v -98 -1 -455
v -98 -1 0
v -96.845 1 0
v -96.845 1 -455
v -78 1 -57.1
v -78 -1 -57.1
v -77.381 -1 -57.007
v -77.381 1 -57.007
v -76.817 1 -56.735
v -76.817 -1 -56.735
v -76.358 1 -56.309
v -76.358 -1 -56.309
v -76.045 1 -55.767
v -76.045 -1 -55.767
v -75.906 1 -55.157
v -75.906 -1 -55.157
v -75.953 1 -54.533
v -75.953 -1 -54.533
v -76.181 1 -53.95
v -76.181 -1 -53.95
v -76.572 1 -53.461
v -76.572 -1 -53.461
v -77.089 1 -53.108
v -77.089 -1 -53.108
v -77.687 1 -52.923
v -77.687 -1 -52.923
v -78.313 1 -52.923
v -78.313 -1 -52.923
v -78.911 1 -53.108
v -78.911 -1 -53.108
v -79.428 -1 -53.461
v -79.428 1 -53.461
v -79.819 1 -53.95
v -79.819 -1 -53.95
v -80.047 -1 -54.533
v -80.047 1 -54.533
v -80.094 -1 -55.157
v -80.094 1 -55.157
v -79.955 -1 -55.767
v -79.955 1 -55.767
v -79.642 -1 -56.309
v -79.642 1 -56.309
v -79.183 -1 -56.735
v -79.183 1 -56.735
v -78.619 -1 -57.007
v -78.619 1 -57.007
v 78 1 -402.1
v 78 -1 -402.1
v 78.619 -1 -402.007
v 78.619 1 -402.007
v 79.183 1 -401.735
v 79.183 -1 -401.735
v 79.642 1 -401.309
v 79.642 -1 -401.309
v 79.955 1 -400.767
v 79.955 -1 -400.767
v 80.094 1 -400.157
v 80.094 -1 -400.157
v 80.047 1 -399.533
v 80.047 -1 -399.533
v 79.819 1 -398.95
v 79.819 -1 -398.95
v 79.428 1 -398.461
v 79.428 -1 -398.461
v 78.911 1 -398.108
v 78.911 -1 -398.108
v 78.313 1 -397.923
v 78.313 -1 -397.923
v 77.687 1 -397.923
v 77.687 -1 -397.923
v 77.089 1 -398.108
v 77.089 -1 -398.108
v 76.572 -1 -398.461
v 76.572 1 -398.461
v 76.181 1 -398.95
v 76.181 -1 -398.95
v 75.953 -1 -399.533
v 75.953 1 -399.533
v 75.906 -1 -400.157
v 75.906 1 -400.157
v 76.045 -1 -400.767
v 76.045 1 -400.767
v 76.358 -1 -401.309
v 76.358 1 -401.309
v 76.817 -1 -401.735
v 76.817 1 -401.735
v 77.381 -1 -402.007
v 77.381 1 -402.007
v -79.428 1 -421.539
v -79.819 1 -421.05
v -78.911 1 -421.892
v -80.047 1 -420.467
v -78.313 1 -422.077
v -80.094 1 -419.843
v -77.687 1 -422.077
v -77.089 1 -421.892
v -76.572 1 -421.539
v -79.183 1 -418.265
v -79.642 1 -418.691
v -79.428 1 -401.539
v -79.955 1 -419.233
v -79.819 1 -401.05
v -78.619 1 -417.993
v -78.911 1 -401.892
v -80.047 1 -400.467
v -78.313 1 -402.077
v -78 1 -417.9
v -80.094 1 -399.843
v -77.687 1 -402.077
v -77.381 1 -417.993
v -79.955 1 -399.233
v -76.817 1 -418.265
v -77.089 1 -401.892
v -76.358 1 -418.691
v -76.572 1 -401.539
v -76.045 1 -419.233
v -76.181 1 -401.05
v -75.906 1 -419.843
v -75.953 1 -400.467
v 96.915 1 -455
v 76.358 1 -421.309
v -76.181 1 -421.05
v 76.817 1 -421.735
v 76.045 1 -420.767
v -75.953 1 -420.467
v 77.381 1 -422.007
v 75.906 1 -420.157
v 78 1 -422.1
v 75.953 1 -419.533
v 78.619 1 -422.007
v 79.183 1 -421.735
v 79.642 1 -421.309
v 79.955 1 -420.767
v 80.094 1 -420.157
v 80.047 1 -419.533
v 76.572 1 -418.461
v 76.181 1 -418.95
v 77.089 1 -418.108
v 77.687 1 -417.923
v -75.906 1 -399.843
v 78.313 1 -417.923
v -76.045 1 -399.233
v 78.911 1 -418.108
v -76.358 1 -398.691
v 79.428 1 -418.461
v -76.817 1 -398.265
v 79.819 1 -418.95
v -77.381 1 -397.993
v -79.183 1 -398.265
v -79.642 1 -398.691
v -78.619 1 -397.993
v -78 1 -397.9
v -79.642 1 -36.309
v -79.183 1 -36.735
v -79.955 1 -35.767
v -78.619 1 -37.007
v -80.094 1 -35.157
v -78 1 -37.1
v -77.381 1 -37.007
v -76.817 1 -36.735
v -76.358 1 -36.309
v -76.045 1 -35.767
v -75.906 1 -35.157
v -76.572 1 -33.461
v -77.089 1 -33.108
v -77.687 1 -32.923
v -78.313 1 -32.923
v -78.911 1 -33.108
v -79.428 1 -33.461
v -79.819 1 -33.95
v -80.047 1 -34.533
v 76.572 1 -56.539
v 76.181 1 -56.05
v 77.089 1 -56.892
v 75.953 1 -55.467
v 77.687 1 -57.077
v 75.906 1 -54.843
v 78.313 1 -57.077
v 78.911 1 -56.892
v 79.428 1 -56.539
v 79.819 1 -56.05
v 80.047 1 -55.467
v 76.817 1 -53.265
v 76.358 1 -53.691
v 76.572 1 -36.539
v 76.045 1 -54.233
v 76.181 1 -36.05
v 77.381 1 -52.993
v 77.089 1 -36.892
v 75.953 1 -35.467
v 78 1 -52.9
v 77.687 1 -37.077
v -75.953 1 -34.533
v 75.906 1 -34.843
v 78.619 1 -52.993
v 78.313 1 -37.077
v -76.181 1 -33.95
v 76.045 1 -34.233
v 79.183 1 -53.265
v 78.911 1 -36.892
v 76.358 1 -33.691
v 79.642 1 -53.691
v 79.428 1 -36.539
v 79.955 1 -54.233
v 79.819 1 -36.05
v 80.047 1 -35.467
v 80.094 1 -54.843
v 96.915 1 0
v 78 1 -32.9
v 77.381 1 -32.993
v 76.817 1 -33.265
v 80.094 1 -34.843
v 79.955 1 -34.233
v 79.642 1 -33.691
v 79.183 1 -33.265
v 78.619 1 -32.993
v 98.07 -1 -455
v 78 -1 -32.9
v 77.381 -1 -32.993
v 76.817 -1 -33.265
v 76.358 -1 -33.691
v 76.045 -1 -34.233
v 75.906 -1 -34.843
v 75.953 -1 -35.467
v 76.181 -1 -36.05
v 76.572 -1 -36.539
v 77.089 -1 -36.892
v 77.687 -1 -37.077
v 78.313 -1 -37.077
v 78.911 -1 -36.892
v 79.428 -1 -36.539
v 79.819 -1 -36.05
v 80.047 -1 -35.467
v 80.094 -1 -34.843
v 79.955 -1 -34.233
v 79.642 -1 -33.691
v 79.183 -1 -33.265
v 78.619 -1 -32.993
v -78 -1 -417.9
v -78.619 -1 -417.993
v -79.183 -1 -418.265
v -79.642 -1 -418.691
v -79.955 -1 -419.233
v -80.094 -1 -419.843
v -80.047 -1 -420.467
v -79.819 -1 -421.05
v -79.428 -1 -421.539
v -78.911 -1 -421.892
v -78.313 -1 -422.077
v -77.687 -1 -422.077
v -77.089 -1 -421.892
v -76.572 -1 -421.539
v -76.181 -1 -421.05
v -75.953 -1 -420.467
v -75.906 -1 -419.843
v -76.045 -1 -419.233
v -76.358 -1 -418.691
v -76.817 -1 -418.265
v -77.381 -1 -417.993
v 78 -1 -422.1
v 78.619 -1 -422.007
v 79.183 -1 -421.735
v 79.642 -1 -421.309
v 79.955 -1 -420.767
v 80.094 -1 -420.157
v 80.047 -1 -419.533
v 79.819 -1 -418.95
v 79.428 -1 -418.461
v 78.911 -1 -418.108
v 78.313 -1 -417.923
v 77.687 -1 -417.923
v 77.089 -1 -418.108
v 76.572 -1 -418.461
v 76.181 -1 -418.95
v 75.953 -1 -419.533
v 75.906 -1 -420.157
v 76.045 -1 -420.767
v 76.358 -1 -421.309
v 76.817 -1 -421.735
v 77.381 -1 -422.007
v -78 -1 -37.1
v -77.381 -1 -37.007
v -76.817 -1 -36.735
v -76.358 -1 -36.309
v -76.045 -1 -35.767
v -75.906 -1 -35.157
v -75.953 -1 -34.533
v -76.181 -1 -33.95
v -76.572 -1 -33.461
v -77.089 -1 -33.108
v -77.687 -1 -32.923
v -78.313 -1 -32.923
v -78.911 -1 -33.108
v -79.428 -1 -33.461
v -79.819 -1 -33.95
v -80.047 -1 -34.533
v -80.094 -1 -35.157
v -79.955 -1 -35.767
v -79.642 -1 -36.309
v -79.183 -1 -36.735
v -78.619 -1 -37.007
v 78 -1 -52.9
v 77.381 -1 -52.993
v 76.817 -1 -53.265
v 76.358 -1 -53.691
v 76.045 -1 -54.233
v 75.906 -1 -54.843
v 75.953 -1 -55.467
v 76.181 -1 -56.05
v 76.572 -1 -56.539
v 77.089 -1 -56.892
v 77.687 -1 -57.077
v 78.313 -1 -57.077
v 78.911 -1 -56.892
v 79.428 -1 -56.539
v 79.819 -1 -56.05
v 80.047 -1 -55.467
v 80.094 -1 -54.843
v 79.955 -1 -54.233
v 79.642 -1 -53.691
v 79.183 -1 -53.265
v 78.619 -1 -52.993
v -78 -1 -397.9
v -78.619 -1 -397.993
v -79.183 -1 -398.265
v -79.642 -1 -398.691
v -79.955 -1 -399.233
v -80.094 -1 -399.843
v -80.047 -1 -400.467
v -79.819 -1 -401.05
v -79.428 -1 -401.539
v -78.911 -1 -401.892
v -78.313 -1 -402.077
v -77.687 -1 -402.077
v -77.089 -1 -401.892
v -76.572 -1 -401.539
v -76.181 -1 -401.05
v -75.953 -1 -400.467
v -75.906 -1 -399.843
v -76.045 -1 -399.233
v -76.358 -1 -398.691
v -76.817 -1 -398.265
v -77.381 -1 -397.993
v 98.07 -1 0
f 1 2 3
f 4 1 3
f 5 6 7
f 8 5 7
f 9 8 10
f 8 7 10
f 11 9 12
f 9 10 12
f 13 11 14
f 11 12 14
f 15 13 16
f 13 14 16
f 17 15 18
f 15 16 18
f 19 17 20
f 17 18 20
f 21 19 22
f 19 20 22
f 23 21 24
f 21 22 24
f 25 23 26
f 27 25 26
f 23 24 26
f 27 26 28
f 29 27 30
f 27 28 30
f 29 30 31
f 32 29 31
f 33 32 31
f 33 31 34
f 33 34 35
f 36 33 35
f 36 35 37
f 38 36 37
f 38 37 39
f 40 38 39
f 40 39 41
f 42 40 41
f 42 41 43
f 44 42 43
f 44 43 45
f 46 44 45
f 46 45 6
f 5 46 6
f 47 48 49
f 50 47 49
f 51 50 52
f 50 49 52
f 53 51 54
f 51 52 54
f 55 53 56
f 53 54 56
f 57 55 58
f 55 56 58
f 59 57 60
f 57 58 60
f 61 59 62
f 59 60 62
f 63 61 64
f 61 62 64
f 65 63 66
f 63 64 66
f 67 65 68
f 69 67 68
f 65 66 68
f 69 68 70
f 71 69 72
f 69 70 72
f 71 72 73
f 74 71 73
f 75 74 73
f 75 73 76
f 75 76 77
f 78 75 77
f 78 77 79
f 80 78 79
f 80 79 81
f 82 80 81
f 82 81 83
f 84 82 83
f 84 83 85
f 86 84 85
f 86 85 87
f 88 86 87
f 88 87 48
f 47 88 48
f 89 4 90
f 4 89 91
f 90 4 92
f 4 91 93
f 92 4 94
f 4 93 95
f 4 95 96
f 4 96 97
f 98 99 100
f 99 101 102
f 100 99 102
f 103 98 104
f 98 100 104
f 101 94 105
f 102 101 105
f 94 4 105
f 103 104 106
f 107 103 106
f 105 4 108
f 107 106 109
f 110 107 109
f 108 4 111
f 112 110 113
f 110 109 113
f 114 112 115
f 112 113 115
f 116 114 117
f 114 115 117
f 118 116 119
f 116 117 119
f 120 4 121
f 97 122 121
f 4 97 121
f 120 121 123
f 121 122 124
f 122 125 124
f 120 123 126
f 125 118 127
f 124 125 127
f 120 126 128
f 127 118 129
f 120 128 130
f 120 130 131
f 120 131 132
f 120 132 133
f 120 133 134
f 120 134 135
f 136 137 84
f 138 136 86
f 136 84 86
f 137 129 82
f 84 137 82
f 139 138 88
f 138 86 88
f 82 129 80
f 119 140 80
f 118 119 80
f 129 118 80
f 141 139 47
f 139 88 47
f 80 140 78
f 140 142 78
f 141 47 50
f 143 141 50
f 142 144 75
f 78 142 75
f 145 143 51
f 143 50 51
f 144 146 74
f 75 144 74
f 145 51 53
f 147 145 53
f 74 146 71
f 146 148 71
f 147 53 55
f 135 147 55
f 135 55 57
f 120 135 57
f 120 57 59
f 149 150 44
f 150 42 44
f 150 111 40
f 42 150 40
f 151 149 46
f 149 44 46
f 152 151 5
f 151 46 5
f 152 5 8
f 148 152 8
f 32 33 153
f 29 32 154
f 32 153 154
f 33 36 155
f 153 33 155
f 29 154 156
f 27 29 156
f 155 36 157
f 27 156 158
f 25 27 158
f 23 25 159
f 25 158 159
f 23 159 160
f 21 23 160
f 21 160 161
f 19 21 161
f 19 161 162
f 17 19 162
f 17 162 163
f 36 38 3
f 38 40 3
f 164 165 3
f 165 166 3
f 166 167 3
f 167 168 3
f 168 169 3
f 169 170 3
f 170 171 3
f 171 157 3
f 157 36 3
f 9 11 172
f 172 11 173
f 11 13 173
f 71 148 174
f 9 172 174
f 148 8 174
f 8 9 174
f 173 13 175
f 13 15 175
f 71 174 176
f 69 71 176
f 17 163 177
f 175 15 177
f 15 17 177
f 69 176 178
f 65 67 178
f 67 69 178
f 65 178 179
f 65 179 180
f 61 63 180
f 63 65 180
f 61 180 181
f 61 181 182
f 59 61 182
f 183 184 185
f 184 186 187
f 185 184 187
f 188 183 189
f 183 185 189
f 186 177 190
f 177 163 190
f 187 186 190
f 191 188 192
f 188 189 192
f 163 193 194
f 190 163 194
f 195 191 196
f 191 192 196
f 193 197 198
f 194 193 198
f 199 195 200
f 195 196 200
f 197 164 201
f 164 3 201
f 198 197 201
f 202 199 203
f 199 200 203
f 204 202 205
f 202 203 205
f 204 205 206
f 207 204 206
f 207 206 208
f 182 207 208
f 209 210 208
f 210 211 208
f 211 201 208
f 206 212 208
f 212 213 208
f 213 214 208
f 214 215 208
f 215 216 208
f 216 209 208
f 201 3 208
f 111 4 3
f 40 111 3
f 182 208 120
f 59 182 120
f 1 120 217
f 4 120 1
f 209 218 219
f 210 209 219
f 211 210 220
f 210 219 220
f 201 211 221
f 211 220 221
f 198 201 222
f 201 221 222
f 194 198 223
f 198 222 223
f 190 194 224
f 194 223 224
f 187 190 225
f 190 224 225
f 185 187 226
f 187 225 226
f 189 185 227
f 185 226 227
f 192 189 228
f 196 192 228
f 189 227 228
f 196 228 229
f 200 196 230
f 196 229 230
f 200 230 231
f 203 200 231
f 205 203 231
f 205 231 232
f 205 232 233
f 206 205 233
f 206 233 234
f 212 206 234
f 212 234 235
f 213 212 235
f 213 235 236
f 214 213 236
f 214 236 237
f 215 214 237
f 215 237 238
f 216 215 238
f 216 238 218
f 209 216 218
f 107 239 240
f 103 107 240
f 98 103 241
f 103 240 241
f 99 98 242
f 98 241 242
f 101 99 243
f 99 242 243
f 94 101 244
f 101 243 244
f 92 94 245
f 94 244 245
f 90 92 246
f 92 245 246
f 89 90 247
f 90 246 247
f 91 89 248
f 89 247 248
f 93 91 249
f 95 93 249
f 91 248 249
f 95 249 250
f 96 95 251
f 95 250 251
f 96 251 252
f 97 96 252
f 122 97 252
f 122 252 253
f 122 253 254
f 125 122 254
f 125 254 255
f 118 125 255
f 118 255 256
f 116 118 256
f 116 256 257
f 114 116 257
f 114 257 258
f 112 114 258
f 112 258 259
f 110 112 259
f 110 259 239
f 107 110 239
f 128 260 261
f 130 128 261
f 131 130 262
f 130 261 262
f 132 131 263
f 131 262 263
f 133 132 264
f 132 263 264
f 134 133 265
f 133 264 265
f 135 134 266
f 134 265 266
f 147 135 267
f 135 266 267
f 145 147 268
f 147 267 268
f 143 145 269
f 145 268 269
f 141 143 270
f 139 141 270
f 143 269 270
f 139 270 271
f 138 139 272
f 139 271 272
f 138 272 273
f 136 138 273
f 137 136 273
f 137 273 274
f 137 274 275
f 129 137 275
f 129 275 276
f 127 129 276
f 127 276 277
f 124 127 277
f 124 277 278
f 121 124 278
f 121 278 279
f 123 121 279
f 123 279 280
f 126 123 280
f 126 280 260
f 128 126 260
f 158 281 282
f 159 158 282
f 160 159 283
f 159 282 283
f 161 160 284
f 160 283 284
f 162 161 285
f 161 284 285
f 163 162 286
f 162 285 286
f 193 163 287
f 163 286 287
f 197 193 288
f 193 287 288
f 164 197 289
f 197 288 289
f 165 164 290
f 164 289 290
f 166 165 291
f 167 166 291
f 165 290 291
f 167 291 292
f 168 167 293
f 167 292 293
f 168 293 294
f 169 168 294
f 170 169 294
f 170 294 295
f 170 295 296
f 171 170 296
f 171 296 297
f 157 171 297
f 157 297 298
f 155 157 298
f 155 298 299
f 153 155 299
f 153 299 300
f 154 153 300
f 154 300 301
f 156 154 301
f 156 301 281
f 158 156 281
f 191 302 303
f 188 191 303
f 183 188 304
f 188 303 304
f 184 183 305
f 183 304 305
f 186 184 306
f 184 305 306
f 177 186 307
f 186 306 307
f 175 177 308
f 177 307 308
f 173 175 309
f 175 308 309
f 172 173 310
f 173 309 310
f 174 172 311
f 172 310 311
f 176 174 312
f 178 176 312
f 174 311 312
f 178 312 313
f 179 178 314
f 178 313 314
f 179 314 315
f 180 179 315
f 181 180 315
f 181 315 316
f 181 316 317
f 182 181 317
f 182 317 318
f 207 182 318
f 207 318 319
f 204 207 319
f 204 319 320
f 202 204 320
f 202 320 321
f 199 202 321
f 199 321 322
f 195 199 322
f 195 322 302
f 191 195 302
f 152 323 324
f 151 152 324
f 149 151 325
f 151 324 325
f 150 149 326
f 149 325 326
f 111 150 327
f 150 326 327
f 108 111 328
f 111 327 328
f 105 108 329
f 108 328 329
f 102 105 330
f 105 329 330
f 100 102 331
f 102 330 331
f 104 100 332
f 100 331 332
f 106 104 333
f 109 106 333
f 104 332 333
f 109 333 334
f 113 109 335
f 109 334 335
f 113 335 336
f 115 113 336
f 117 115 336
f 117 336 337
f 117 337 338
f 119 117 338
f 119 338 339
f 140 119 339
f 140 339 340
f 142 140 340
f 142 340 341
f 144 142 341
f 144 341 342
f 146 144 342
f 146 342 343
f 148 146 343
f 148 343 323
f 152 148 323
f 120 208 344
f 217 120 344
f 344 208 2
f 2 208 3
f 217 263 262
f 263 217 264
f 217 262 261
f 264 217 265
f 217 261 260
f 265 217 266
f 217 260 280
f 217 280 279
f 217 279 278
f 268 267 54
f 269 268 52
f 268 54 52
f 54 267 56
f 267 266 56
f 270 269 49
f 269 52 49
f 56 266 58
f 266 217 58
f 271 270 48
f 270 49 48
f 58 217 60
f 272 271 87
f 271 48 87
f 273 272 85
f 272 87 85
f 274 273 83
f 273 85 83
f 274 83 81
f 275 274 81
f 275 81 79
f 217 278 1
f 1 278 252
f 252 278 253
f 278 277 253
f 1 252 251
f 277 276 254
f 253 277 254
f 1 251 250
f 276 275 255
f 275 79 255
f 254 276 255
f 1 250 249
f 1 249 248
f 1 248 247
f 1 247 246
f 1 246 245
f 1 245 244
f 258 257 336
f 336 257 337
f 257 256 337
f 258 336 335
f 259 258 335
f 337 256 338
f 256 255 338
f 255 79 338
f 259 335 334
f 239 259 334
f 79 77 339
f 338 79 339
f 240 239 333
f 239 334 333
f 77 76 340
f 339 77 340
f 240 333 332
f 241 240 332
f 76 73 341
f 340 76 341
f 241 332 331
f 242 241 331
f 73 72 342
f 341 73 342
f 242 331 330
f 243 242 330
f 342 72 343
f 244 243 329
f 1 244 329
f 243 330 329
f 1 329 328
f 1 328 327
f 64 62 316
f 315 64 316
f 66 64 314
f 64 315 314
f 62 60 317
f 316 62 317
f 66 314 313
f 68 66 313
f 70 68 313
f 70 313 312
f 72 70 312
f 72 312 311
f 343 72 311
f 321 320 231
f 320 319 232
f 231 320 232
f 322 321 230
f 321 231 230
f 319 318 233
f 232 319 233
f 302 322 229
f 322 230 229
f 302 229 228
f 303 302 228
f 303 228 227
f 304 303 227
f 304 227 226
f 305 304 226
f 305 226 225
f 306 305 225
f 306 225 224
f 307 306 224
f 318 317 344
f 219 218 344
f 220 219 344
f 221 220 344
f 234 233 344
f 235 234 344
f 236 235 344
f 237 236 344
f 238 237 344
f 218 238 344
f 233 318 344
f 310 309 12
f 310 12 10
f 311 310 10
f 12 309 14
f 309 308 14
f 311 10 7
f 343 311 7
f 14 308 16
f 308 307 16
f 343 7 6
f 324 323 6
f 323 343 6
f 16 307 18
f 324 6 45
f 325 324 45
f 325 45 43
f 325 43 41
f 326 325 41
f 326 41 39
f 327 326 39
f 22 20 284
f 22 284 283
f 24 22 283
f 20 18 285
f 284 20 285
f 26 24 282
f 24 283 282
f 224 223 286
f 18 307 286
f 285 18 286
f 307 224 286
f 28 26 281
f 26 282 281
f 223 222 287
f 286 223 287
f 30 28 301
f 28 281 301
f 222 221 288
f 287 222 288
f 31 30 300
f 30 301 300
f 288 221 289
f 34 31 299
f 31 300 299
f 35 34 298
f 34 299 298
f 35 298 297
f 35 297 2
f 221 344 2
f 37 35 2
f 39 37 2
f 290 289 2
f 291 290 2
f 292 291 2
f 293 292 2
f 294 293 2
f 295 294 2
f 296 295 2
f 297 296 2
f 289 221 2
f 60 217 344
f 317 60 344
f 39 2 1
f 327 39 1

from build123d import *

# Parameters (mm, degrees)
EXTRUDE_1_DEPTH     = 455
SKETCH_3_R          = 2.1
CUT_EXTRUDE_1_DEPTH = 466.453246739


with BuildPart() as part:
    # 草图2 → 凸台-拉伸1 (new body)
    with BuildSketch(Plane.XY):
        Polygon((-98, -1), (-96.845299462, 1), (96.915299462, 1), (98.07, -1), align=None)
    extrude(amount=-EXTRUDE_1_DEPTH)

    # 草图3 → 切除-拉伸1 (cut, through all)
    with BuildSketch(Plane(origin=(0, -1, 0), x_dir=(-1, 0, 0), z_dir=(0, -1, 0))):
        with Locations(Location((78, 35, 0), (0, 0, 90))):
            Circle(SKETCH_3_R)
        with Locations(Location((78, 55, 0), (0, 0, 90))):
            Circle(SKETCH_3_R)
        with Locations(Location((-78, 55, 0), (0, 0, 270))):
            Circle(SKETCH_3_R)
        with Locations(Location((-78, 35, 0), (0, 0, 270))):
            Circle(SKETCH_3_R)
        with Locations(Location((-78, 420, 0), (0, 0, 90))):
            Circle(SKETCH_3_R)
        with Locations(Location((-78, 400, 0), (0, 0, 90))):
            Circle(SKETCH_3_R)
        with Locations(Location((78, 400, 0), (0, 0, 270))):
            Circle(SKETCH_3_R)
        with Locations(Location((78, 420, 0), (0, 0, 270))):
            Circle(SKETCH_3_R)
    extrude(amount=-CUT_EXTRUDE_1_DEPTH, mode=Mode.SUBTRACT)


solid = part.part
